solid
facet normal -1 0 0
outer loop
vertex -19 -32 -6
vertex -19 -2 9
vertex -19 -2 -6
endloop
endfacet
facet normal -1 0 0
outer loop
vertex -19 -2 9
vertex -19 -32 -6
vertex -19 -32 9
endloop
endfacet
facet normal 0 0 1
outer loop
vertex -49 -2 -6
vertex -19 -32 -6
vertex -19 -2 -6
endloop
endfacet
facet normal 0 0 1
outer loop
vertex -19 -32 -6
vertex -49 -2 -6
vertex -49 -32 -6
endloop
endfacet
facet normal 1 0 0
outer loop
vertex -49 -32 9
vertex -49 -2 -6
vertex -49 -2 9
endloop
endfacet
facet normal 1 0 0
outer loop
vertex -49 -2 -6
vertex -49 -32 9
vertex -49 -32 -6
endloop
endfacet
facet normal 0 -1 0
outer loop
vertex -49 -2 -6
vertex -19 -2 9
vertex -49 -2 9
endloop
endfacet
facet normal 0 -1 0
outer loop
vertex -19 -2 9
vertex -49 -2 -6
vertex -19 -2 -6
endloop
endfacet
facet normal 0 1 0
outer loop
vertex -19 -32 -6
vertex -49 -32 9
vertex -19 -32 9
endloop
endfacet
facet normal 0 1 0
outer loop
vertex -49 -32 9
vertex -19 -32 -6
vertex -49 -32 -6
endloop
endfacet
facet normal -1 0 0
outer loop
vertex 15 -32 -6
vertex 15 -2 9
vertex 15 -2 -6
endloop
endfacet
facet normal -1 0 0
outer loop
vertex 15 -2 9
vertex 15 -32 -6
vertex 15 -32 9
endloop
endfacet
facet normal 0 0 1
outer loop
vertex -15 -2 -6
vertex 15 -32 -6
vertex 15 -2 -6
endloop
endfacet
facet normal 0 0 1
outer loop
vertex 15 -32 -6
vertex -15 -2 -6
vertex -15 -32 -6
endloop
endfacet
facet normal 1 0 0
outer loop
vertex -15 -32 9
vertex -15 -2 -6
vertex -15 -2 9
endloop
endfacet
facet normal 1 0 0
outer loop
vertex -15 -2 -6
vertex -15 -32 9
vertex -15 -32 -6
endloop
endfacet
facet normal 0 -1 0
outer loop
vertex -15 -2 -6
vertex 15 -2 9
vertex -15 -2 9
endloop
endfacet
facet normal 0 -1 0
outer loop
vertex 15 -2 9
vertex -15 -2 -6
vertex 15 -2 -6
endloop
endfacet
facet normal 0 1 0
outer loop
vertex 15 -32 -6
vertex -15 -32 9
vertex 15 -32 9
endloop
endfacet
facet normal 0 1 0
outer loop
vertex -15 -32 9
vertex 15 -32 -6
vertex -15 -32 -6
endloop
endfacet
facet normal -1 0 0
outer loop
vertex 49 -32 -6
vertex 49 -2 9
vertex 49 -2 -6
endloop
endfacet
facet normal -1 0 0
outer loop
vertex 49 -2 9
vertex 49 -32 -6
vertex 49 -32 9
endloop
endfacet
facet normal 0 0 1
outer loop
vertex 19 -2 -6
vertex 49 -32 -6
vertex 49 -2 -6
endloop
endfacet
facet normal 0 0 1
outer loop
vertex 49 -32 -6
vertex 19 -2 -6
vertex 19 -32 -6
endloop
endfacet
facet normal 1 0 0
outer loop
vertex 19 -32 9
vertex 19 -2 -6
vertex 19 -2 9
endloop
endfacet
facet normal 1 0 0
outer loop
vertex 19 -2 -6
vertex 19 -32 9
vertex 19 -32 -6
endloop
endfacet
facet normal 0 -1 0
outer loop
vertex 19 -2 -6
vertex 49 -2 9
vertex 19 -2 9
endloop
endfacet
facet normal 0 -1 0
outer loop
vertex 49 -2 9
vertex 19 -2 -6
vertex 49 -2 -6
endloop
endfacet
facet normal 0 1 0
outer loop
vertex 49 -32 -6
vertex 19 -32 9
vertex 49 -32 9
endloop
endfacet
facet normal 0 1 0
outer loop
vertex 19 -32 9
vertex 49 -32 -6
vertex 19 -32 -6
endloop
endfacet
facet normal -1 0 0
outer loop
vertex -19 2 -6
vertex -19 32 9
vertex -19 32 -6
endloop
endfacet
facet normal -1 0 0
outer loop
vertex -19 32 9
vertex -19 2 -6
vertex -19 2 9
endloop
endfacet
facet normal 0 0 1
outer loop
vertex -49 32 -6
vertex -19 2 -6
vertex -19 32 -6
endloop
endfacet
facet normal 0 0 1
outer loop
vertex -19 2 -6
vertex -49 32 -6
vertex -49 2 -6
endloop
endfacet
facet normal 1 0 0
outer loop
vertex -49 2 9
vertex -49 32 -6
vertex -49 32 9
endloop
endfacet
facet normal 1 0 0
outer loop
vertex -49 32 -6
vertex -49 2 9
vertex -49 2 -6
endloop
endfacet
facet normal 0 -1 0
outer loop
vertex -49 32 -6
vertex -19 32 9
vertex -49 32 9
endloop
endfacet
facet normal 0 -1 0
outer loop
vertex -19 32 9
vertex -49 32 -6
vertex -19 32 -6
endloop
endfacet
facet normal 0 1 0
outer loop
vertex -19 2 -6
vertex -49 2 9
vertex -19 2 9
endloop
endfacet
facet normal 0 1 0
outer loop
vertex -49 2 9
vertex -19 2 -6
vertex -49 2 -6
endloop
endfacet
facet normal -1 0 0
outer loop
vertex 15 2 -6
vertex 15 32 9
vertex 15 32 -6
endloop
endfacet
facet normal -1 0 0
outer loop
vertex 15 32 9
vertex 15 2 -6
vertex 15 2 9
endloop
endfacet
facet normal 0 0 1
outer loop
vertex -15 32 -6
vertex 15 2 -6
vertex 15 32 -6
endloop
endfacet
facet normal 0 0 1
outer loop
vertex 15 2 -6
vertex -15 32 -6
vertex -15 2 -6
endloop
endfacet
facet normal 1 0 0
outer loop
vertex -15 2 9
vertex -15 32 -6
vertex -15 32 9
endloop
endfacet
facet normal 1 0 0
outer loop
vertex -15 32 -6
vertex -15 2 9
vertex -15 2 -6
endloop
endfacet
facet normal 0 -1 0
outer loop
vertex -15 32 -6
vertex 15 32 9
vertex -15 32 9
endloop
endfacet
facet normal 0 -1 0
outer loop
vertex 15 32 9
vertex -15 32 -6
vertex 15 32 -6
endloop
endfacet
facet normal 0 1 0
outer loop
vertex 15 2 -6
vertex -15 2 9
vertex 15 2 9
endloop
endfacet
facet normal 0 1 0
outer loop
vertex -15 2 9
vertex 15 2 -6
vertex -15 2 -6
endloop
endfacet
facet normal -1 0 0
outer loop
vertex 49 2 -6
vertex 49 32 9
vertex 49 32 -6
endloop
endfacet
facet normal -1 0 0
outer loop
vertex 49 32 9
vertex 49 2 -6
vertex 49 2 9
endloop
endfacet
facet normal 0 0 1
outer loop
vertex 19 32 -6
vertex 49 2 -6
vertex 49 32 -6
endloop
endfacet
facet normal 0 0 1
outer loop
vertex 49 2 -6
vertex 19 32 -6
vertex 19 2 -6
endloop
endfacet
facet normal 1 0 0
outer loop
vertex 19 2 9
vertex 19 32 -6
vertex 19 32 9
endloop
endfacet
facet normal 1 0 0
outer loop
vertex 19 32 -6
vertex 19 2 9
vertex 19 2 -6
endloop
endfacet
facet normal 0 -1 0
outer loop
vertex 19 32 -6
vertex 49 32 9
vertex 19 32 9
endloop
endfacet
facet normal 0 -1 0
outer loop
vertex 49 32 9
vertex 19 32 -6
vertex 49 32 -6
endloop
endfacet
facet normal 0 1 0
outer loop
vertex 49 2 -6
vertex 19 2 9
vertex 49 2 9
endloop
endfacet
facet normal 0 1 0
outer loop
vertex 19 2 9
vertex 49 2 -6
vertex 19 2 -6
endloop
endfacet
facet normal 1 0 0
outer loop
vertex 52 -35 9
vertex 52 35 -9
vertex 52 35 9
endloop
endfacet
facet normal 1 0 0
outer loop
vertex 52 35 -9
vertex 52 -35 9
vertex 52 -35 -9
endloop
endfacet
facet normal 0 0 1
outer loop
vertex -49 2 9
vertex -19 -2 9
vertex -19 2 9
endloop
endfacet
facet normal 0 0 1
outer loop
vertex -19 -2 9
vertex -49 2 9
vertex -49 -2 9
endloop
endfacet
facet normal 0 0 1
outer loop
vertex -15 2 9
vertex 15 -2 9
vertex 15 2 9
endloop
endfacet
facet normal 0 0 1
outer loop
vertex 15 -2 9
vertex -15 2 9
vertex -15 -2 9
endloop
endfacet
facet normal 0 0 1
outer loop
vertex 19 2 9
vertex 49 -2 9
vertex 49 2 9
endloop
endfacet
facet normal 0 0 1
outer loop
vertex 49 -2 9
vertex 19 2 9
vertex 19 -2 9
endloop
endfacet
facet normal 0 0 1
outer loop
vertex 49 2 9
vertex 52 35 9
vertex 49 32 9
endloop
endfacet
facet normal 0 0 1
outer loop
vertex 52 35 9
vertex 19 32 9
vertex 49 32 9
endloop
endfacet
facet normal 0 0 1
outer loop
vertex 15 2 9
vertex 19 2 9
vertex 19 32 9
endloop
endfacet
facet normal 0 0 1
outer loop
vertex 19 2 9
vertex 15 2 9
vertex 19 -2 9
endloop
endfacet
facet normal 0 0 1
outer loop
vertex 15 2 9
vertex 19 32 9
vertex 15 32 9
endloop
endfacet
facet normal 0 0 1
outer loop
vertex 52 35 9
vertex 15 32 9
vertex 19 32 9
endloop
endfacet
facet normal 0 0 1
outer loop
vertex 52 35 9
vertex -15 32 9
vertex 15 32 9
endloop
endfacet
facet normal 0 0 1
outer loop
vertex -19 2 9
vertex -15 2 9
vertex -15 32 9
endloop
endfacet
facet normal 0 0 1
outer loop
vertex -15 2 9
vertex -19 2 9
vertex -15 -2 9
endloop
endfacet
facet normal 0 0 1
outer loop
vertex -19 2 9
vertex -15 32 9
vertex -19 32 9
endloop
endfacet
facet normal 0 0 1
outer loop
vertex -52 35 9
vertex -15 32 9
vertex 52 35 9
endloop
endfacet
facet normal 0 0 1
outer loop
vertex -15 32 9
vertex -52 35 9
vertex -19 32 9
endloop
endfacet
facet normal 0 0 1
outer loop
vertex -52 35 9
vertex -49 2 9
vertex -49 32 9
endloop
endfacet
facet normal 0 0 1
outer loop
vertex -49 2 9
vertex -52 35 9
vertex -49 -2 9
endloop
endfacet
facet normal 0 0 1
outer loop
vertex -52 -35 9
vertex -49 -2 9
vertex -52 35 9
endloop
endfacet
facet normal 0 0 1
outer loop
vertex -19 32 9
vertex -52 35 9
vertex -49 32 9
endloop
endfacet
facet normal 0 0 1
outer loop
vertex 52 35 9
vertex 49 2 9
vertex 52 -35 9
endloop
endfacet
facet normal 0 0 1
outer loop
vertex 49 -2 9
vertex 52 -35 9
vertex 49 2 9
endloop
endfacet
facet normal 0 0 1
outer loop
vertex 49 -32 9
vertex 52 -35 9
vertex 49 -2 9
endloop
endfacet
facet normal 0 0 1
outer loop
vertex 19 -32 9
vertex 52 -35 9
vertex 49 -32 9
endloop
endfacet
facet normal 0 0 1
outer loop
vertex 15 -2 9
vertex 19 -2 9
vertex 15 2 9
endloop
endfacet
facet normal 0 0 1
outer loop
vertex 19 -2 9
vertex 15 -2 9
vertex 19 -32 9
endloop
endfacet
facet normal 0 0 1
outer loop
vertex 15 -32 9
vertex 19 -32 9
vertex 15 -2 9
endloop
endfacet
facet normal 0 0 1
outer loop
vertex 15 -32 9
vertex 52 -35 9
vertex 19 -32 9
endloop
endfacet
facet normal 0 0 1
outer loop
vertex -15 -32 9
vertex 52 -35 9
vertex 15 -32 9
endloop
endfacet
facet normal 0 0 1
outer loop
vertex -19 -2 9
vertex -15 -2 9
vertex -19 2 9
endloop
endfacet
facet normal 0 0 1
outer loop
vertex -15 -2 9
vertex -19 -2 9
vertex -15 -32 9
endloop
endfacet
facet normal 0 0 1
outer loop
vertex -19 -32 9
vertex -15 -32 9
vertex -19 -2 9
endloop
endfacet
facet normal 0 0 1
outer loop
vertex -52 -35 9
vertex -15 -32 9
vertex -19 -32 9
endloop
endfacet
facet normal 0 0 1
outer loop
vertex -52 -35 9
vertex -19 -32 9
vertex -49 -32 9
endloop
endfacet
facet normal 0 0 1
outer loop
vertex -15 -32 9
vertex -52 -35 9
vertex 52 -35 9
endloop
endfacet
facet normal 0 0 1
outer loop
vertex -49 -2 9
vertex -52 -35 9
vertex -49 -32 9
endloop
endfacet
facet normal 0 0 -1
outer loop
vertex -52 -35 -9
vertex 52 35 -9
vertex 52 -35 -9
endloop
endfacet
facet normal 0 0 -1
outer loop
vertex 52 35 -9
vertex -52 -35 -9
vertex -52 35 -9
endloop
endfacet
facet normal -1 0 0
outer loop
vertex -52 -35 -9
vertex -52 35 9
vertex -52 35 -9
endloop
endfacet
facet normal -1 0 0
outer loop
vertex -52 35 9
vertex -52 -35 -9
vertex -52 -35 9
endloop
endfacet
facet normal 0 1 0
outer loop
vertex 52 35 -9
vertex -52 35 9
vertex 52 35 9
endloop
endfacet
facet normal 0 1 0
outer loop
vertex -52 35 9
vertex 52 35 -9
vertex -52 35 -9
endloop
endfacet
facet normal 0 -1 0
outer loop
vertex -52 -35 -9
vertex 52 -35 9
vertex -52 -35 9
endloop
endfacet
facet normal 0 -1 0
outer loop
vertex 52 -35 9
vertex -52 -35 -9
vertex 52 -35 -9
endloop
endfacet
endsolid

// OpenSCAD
$fn = 32;

// ----------------------------------------------------------------------
// Pocket plate 104 x 70 x 18
// 2 x 3 pockets 30 mm square, 15 mm deep
// ----------------------------------------------------------------------

// --- parameters (mm) ---
thickness = 18;  // plate thickness
seat_tol = 0.1;  // tolerance at the seating features
free_tol = 0.3;  // general tolerance on the free sizes
floor_t = 3;     // material left under each pocket
pocket = 30;     // pocket side length
pitch_x = 34;    // pocket pitch along X
pitch_y = 34;    // pocket pitch along Y
cols = 3;        // pockets per row
rows = 2;        // rows of pockets

// --- derived feature positions (mm) ---
depth = thickness - floor_t;        // = 15   pocket depth, down to the floor
span_x = (cols - 1) * pitch_x;      // = 68   distance between outer pockets
span_y = (rows - 1) * pitch_y;      // = 34   distance between outer pocket rows
origin_x = -span_x / 2;             // = -34   X of the first pocket
origin_y = -span_y / 2;             // = -17   Y of the first pocket
plate = [span_x + pocket + 6, span_y + pocket + 6, thickness];  // = [104, 70, 18]   overall size: pockets plus 3 mm of wall on each side
feature_centers = [
  [origin_x + 0 * pitch_x, origin_y + 0 * pitch_y],
  [origin_x + 1 * pitch_x, origin_y + 0 * pitch_y],
  [origin_x + 2 * pitch_x, origin_y + 0 * pitch_y],
  [origin_x + 0 * pitch_x, origin_y + 1 * pitch_y],
  [origin_x + 1 * pitch_x, origin_y + 1 * pitch_y],
  [origin_x + 2 * pitch_x, origin_y + 1 * pitch_y]
];   // pocket centres, used verbatim by the cutter loop

// plate outline, then one pocket per centre in feature_centers
difference() {
  cube(plate, center = true);
  for (centre = feature_centers)
    translate([centre[0] - pocket / 2, centre[1] - pocket / 2, plate[2] / 2 - depth])
      cube([pocket, pocket, depth + 1]);  // centred on the declared pocket centre
}
